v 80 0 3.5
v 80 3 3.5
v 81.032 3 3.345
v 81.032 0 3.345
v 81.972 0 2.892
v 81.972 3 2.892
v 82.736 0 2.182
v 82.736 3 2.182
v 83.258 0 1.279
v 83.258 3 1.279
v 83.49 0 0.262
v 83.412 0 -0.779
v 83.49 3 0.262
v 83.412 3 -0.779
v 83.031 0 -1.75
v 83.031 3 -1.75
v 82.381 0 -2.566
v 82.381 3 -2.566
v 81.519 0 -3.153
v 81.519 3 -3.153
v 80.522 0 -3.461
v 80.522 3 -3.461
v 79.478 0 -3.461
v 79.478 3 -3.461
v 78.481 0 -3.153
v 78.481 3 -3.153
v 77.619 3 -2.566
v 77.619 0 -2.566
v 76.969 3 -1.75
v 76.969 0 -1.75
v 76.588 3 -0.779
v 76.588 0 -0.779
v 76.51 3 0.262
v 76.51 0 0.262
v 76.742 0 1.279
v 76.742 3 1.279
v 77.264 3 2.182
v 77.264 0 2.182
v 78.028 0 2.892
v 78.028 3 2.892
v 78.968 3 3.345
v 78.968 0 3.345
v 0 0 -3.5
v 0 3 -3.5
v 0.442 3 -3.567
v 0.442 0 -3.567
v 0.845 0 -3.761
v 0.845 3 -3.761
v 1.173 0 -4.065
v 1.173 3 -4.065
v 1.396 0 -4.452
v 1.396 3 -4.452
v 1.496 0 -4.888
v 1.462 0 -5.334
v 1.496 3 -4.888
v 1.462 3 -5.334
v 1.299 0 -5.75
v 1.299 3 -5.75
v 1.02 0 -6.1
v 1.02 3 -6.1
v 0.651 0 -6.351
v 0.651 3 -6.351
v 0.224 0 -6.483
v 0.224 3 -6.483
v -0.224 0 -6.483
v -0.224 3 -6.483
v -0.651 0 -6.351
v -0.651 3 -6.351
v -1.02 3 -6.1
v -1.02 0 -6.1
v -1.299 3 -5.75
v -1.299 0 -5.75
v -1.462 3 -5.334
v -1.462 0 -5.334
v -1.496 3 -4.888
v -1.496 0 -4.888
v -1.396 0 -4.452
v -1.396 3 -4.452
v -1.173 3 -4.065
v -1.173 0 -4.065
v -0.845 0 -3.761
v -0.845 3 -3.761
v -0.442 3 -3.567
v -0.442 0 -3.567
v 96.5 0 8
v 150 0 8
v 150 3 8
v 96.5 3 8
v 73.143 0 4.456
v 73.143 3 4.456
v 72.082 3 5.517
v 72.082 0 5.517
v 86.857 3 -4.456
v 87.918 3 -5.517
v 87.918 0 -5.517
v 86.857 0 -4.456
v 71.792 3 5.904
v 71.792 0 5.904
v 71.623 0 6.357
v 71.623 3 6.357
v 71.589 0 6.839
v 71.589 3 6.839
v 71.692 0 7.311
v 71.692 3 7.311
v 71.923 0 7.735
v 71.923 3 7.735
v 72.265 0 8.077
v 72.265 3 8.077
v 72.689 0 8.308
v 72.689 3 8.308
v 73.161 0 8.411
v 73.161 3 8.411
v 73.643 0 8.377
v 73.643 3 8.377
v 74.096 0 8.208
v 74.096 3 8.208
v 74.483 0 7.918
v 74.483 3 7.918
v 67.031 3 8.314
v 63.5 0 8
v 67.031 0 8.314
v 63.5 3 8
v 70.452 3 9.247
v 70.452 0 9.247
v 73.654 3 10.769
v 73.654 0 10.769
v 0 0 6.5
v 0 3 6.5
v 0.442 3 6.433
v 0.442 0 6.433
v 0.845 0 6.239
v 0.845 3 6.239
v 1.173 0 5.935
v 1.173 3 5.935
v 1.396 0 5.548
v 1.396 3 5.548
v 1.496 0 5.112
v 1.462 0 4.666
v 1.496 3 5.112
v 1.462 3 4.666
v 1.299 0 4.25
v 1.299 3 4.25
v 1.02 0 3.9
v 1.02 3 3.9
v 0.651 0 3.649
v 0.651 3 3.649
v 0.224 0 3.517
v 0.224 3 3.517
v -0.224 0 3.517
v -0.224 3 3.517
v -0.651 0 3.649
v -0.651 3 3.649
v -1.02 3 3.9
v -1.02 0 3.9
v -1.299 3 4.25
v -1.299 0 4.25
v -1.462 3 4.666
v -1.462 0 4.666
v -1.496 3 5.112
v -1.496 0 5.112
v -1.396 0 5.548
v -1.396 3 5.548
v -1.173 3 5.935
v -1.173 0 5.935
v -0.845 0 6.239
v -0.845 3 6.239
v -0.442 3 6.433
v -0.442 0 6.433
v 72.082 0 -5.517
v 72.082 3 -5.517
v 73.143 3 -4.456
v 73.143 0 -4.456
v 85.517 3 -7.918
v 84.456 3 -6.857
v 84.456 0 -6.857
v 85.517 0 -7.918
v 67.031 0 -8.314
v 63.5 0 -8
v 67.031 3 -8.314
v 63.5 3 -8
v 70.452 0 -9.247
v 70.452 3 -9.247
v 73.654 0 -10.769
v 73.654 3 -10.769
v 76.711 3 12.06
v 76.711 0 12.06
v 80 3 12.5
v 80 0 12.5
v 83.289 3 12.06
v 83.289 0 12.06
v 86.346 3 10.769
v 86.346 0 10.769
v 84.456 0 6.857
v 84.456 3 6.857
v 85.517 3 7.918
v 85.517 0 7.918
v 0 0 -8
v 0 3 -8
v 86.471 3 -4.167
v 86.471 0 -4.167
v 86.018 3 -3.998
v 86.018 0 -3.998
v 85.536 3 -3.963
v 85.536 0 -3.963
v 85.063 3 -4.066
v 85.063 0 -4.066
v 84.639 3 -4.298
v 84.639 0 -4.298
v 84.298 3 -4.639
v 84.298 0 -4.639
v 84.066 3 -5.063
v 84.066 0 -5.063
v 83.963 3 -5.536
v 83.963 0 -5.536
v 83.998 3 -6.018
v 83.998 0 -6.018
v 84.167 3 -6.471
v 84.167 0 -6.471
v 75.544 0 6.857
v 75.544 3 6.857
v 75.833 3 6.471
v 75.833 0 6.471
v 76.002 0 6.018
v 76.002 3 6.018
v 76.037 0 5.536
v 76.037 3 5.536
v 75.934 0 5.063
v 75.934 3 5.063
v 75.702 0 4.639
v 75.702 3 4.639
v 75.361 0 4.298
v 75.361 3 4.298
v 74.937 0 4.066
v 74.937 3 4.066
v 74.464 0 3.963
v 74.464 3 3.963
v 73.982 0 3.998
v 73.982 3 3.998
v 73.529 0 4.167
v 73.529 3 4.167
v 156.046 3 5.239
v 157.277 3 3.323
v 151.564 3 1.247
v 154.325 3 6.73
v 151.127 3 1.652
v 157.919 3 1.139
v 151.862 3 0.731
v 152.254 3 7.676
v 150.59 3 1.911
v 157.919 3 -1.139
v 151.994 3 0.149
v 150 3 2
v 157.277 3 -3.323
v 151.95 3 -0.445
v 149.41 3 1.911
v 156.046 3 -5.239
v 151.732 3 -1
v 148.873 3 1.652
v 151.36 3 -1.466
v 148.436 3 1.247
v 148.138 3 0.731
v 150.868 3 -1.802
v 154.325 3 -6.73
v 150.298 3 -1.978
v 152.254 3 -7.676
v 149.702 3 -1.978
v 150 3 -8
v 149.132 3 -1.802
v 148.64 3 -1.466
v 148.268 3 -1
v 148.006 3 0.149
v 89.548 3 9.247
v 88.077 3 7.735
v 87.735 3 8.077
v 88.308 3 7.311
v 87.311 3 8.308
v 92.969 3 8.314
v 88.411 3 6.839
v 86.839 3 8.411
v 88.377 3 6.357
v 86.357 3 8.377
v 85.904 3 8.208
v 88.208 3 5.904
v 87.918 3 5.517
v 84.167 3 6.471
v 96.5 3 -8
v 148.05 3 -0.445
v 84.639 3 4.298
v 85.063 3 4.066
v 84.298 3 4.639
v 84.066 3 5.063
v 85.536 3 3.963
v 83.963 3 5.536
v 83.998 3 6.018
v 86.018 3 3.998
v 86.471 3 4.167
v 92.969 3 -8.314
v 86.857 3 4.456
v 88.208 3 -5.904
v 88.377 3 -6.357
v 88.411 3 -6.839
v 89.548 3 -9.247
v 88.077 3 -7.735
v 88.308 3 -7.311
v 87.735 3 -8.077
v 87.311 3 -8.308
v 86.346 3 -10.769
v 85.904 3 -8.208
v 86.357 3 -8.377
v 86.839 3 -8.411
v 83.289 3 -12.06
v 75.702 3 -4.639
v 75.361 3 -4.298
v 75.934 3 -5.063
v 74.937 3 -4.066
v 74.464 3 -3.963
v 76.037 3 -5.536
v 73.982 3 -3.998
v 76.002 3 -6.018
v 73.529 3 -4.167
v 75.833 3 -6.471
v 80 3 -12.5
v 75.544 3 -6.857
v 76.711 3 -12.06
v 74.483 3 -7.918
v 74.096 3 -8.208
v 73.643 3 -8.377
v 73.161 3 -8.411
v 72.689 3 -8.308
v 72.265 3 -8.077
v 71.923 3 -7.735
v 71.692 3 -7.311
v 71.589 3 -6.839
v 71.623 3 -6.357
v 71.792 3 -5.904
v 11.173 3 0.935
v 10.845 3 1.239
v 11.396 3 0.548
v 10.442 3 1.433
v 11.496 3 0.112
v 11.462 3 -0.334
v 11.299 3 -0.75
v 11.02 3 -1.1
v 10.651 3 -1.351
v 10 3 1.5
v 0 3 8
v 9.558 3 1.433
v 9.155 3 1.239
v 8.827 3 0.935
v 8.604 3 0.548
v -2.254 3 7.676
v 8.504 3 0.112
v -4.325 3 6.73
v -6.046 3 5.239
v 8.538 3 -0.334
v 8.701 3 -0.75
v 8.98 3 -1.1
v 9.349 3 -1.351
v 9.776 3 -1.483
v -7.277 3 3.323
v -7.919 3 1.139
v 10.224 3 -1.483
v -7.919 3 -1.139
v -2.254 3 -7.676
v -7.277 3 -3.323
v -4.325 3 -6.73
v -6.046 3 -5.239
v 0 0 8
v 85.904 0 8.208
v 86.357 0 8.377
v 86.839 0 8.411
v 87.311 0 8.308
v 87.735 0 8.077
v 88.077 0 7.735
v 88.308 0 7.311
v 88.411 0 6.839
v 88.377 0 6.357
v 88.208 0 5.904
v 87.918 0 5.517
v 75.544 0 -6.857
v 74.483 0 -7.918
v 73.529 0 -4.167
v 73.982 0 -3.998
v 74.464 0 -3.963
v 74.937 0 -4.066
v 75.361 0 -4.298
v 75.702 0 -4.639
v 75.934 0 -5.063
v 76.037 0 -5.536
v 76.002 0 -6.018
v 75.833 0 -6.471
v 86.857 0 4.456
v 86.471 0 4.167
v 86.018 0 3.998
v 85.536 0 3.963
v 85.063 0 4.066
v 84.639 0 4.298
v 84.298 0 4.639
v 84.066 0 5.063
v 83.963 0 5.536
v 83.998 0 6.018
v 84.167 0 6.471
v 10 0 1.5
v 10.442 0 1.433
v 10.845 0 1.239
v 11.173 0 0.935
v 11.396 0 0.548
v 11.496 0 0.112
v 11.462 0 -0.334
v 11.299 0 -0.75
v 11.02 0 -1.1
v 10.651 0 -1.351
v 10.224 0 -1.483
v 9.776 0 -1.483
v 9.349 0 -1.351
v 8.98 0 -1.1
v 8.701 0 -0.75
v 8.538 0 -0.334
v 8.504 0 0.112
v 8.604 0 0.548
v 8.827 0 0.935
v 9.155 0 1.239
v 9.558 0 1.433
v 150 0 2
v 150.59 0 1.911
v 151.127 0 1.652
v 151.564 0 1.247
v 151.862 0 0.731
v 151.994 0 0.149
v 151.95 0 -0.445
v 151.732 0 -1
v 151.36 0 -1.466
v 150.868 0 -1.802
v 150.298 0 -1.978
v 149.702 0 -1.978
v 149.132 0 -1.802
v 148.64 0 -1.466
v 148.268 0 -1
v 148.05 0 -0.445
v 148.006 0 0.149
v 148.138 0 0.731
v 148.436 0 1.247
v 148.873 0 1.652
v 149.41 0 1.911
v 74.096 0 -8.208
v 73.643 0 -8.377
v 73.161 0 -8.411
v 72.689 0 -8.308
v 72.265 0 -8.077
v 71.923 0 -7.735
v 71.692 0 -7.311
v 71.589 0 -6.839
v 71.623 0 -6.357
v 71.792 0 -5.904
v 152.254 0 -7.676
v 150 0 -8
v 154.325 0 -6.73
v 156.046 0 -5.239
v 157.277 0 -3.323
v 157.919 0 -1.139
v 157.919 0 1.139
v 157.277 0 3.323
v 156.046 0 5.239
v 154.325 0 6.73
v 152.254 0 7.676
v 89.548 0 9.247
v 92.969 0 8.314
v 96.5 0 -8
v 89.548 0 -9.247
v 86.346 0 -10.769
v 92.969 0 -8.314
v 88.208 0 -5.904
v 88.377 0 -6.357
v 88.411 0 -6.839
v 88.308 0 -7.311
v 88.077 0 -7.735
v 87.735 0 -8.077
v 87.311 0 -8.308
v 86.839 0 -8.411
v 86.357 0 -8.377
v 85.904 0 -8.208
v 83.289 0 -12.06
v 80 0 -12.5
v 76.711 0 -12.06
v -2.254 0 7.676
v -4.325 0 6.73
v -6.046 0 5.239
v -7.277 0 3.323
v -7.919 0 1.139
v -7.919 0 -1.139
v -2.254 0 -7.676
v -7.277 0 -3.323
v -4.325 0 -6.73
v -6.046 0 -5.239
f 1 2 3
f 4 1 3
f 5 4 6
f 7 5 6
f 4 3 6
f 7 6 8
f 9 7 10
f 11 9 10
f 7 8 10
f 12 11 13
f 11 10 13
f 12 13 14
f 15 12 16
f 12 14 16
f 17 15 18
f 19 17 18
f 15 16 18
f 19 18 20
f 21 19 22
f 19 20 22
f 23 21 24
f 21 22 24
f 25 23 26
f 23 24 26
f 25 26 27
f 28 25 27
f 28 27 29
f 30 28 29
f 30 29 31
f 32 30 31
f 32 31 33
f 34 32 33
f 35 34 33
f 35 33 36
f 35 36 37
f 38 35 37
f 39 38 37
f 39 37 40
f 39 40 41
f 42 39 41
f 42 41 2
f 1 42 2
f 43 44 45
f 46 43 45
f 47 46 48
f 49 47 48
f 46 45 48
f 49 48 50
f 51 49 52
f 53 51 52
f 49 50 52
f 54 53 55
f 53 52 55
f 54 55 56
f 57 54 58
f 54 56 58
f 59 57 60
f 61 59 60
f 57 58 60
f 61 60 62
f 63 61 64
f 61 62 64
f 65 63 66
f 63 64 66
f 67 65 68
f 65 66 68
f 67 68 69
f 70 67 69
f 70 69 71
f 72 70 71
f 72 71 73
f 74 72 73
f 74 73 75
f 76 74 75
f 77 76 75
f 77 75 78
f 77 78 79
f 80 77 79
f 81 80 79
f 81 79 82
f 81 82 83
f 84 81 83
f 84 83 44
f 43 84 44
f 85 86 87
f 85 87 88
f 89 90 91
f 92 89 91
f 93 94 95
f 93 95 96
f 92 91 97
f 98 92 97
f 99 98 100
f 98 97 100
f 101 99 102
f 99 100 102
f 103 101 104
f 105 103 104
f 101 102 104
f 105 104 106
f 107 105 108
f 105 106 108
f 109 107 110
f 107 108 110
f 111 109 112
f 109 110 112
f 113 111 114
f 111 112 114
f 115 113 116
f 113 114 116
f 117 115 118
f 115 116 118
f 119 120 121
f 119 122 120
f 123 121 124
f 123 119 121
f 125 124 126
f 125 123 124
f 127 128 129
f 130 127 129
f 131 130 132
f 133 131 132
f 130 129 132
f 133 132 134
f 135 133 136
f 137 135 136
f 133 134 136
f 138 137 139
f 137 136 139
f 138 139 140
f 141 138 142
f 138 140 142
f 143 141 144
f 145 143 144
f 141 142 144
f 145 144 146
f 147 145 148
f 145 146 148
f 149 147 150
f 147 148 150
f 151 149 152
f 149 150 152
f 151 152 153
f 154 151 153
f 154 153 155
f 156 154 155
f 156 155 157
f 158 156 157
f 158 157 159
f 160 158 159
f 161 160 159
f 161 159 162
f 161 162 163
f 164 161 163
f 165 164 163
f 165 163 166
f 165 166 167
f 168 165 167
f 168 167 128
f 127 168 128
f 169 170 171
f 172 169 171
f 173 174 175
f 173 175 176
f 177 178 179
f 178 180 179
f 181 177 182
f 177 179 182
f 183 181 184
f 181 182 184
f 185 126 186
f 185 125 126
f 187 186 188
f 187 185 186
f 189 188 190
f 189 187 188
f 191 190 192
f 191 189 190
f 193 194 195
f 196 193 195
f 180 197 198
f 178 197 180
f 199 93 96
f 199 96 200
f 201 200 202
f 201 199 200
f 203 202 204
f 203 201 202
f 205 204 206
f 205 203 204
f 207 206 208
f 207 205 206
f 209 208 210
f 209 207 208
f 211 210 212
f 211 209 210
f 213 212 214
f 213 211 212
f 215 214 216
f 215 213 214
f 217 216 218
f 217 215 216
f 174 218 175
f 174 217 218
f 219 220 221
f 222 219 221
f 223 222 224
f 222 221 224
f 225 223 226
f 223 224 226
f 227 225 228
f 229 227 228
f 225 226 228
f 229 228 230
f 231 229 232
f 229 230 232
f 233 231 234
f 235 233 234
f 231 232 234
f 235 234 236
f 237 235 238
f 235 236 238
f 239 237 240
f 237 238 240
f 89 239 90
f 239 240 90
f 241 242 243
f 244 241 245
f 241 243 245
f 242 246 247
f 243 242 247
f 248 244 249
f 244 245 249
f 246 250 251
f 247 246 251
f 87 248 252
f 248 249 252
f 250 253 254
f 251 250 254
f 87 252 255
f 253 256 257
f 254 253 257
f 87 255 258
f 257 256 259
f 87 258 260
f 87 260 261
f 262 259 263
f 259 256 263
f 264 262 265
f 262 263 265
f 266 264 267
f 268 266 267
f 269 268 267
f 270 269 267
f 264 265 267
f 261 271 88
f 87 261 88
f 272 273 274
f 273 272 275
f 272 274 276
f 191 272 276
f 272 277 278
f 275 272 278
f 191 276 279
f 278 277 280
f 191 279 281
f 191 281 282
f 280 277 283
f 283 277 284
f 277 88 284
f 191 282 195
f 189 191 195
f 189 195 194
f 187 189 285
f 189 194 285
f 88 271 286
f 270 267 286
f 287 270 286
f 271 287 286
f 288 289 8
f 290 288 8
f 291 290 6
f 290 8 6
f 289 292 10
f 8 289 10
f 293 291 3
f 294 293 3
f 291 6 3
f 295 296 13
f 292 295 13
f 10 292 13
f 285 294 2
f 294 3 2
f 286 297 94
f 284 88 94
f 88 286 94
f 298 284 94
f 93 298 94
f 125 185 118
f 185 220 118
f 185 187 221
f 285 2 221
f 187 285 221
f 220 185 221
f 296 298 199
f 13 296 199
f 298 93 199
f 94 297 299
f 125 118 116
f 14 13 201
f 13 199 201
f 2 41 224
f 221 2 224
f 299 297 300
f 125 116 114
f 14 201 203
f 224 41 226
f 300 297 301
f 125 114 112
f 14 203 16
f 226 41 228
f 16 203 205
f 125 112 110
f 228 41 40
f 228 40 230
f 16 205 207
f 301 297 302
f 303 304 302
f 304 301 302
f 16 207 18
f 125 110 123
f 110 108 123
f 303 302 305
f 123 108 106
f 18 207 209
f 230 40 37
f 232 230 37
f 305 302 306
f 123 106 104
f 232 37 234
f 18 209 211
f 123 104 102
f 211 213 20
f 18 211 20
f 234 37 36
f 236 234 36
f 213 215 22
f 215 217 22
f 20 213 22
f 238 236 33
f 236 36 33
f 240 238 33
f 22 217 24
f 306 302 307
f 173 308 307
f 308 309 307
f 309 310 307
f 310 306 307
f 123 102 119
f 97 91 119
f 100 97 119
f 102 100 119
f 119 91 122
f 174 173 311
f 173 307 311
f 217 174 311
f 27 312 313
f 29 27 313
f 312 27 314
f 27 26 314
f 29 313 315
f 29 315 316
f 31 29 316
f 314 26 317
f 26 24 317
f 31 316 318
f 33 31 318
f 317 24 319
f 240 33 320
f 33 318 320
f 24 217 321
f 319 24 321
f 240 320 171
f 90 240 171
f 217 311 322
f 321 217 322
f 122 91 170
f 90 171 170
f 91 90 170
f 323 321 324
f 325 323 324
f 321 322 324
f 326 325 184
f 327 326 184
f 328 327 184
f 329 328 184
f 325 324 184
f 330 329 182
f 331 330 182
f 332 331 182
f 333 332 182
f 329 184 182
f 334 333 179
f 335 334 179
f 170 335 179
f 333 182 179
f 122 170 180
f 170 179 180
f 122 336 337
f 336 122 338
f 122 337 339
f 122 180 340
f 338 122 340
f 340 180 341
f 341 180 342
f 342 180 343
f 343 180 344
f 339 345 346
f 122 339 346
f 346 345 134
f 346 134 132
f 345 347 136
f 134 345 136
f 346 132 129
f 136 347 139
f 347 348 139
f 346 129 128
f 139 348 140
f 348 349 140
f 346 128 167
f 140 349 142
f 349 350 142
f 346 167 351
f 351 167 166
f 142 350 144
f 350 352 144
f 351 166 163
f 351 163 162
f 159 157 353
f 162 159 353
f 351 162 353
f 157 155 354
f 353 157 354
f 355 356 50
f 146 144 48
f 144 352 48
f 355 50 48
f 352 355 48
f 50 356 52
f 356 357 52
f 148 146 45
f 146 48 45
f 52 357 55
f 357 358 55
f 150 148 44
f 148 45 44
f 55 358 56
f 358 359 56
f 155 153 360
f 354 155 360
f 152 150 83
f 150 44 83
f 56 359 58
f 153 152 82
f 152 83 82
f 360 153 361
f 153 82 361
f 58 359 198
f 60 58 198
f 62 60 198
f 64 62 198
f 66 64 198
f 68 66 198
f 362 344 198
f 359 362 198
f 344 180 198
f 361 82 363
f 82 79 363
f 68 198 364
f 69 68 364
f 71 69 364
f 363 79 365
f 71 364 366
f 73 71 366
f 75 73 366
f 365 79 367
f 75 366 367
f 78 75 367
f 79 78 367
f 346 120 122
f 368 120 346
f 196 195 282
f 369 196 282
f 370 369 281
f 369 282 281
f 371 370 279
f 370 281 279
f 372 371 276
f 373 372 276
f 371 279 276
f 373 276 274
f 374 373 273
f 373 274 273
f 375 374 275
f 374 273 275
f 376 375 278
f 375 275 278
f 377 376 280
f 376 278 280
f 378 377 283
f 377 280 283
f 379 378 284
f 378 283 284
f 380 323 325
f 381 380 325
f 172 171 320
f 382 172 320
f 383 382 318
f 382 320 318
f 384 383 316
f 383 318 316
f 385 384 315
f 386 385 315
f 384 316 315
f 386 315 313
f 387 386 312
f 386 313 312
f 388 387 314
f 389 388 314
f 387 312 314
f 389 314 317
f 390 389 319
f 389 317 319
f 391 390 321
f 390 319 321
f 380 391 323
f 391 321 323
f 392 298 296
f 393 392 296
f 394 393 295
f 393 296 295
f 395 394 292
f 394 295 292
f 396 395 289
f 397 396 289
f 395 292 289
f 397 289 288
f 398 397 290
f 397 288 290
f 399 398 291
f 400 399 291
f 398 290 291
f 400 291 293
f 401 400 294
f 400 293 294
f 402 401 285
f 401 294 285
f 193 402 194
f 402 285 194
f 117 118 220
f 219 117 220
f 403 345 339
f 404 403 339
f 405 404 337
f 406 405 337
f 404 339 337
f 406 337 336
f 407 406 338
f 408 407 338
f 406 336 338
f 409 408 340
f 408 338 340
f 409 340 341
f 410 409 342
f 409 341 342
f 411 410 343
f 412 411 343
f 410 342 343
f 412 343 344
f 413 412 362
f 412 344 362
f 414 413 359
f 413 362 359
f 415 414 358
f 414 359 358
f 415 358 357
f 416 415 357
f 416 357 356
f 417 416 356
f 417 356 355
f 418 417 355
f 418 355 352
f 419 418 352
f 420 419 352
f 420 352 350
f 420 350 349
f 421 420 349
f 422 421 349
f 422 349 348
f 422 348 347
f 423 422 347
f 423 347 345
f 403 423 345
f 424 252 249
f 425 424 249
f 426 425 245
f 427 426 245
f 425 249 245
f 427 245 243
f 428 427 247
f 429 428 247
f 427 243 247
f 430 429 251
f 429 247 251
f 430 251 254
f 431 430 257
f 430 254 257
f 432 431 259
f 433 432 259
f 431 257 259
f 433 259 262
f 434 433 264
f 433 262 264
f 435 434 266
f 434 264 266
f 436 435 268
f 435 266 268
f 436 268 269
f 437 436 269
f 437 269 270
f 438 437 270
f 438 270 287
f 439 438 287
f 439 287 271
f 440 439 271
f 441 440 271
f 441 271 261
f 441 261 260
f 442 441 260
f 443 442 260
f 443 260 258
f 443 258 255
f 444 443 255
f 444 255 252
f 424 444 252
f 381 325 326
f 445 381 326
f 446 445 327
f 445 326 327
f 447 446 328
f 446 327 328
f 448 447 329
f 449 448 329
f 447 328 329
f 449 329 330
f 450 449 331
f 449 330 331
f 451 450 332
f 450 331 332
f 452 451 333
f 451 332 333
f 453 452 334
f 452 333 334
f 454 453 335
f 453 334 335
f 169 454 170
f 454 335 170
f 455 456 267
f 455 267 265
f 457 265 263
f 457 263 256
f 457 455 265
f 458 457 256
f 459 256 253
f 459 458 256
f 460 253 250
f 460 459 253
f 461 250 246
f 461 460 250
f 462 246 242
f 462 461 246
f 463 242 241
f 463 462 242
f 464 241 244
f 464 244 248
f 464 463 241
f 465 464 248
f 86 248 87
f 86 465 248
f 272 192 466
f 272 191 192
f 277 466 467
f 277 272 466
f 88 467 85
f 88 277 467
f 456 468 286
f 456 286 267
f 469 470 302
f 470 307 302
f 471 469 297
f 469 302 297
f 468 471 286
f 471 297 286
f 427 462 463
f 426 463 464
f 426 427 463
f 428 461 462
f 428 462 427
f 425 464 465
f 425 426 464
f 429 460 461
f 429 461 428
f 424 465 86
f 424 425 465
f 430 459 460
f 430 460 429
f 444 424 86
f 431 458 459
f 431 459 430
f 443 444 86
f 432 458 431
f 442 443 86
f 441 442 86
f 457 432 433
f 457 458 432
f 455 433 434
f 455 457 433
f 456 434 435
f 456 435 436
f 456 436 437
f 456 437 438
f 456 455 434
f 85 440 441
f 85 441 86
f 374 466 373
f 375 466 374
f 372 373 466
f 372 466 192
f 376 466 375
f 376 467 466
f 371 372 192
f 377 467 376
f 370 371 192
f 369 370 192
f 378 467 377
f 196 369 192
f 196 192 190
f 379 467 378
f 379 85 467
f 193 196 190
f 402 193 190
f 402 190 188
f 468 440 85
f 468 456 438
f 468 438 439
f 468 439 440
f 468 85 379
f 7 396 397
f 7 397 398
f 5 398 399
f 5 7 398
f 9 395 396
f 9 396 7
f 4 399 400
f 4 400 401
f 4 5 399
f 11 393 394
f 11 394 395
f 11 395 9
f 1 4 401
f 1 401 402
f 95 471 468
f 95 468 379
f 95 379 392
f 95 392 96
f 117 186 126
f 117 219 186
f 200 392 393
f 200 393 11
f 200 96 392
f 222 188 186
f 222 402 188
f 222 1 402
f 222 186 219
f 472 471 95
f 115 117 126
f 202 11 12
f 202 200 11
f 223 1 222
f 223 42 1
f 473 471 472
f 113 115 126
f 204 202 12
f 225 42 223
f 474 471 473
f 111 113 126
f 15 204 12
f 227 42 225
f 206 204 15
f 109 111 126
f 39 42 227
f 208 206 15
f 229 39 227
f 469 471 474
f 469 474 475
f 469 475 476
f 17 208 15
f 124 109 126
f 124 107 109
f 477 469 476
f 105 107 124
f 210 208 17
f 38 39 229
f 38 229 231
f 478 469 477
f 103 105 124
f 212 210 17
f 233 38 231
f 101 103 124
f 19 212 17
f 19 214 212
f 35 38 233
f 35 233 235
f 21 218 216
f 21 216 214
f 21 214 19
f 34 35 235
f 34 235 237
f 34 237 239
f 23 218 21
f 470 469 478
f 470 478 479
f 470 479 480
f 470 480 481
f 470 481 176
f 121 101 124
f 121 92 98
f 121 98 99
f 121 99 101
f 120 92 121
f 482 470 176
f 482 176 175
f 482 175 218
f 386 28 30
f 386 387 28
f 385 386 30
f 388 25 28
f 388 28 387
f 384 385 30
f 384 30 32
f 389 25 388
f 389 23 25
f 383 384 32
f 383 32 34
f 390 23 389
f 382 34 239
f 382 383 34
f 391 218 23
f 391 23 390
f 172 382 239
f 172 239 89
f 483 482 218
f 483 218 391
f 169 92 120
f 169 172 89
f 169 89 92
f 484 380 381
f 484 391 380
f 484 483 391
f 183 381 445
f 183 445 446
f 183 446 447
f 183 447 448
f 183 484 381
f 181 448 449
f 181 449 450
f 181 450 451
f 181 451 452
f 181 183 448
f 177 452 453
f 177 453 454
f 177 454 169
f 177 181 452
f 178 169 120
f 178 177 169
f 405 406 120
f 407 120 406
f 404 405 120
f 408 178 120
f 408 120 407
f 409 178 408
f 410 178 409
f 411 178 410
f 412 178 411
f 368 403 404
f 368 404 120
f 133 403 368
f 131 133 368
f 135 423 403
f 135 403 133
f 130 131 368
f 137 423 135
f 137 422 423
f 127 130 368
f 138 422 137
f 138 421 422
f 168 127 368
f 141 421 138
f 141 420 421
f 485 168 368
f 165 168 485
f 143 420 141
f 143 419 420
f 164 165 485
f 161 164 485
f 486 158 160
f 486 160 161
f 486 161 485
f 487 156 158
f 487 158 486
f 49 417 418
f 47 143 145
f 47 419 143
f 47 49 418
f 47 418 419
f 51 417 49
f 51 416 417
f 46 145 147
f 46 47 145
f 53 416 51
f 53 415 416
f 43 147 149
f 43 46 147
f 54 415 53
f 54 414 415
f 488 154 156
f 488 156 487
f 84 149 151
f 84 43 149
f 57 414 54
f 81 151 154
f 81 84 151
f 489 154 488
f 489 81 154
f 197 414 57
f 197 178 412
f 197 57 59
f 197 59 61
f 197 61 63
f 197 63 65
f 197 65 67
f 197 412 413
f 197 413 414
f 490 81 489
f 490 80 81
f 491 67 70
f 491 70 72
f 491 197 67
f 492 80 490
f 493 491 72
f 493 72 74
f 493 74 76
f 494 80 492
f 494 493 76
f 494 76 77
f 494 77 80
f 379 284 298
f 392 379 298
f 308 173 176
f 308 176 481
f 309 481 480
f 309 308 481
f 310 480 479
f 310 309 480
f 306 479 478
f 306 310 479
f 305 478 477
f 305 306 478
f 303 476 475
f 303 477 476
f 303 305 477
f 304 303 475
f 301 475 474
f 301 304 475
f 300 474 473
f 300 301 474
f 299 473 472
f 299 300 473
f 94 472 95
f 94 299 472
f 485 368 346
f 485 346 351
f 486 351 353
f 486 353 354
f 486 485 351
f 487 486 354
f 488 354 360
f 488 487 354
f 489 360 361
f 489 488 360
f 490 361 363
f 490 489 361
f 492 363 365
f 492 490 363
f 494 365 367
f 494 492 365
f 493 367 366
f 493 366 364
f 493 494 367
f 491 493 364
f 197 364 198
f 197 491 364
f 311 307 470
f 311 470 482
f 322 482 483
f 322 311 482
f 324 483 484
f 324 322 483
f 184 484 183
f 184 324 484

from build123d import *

# Parameters (mm, degrees)
EXTRUDE_1_DEPTH     = 3
SKETCH_8_R          = 12.5
EXTRUDE_2_DEPTH     = 3
SKETCH_2_R          = 3.5
CUT_EXTRUDE_1_DEPTH = 159.522080481
SKETCH_5_R          = 1.5
CUT_EXTRUDE_2_DEPTH = 159.522080481
FILLET_3_R          = 20
SKETCH_9_R          = 2
CUT_EXTRUDE_3_DEPTH = 159.522080481


with BuildPart() as part:
    # 草图1 → 凸台-拉伸1 (new body)
    with BuildSketch(Plane(origin=(0, 0, 0), x_dir=(1, 0, 0), z_dir=(0, 1, 0))):
        with BuildLine():
            Line((0, 8), (150, 8))
            ThreePointArc((150, 8), (158, 0), (150, -8))
            Line((150, -8), (0, -8))
            ThreePointArc((0, -8), (-8, 0), (0, 8))
        make_face()
    extrude(amount=EXTRUDE_1_DEPTH)

    # 草图8 → 凸台-拉伸2 (add)
    with BuildSketch(Plane(origin=(0, 3, 0), x_dir=(1, 0, 0), z_dir=(0, 1, 0))):
        with Locations((80, 0)):
            Circle(SKETCH_8_R)
    extrude(amount=-EXTRUDE_2_DEPTH)

    # 草图2 → 切除-拉伸1 (cut, through all)
    with BuildSketch(Plane(origin=(0, 3, 0), x_dir=(1, 0, 0), z_dir=(0, 1, 0))):
        with Locations(Location((80, 0, 0), (0, 0, 270))):
            Circle(SKETCH_2_R)
        with BuildLine():
            Line((84.456249475, 6.857459024), (85.516909647, 7.918119195))
            ThreePointArc((85.516909647, 7.918119195), (87.918119195, 7.918119195), (87.918119195, 5.516909647))
            Line((87.918119195, 5.516909647), (86.857459024, 4.456249475))
            ThreePointArc((86.857459024, 4.456249475), (84.456249475, 4.456249475), (84.456249475, 6.857459024))
        make_face()
        with BuildLine():
            Line((84.456249475, -6.857459024), (85.516909647, -7.918119195))
            ThreePointArc((85.516909647, -7.918119195), (87.918119195, -7.918119195), (87.918119195, -5.516909647))
            Line((87.918119195, -5.516909647), (86.857459024, -4.456249475))
            ThreePointArc((86.857459024, -4.456249475), (84.456249475, -4.456249475), (84.456249475, -6.857459024))
        make_face()
        with BuildLine():
            Line((73.142540976, -4.456249475), (72.081880805, -5.516909647))
            ThreePointArc((72.081880805, -5.516909647), (72.081880805, -7.918119195), (74.483090353, -7.918119195))
            Line((74.483090353, -7.918119195), (75.543750525, -6.857459024))
            ThreePointArc((75.543750525, -6.857459024), (75.543750525, -4.456249475), (73.142540976, -4.456249475))
        make_face()
        with BuildLine():
            Line((75.543750525, 6.857459024), (74.483090353, 7.918119195))
            ThreePointArc((74.483090353, 7.918119195), (72.081880805, 7.918119195), (72.081880805, 5.516909647))
            Line((72.081880805, 5.516909647), (73.142540976, 4.456249475))
            ThreePointArc((73.142540976, 4.456249475), (75.543750525, 4.456249475), (75.543750525, 6.857459024))
        make_face()
    extrude(amount=-CUT_EXTRUDE_1_DEPTH, mode=Mode.SUBTRACT)

    # 草图5 → 切除-拉伸2 (cut, through all)
    with BuildSketch(Plane(origin=(0, 3, 0), x_dir=(1, 0, 0), z_dir=(0, 1, 0))):
        with Locations(Location((10, 0, 0), (0, 0, 270))):
            Circle(SKETCH_5_R)
        with Locations(Location((0, 5, 0), (0, 0, 270))):
            Circle(SKETCH_5_R)
        with Locations(Location((0, -5, 0), (0, 0, 270))):
            Circle(SKETCH_5_R)
    extrude(amount=-CUT_EXTRUDE_2_DEPTH, mode=Mode.SUBTRACT)

    # 圆角3
    fillet_3_edges = [part.edges().sort_by_distance(p)[0] for p in [
        (70.395313644, 1.5, 8),
        (70.395313644, 1.5, -8),
        (89.604686356, 1.5, 8),
        (89.604686356, 1.5, -8),
    ]]
    fillet(fillet_3_edges, radius=FILLET_3_R)

    # 草图9 → 切除-拉伸3 (cut, through all)
    with BuildSketch(Plane(origin=(0, 3, 0), x_dir=(1, 0, 0), z_dir=(0, 1, 0))):
        with Locations(Location((150, 0, 0), (0, 0, 270))):
            Circle(SKETCH_9_R)
    extrude(amount=-CUT_EXTRUDE_3_DEPTH, mode=Mode.SUBTRACT)


solid = part.part
